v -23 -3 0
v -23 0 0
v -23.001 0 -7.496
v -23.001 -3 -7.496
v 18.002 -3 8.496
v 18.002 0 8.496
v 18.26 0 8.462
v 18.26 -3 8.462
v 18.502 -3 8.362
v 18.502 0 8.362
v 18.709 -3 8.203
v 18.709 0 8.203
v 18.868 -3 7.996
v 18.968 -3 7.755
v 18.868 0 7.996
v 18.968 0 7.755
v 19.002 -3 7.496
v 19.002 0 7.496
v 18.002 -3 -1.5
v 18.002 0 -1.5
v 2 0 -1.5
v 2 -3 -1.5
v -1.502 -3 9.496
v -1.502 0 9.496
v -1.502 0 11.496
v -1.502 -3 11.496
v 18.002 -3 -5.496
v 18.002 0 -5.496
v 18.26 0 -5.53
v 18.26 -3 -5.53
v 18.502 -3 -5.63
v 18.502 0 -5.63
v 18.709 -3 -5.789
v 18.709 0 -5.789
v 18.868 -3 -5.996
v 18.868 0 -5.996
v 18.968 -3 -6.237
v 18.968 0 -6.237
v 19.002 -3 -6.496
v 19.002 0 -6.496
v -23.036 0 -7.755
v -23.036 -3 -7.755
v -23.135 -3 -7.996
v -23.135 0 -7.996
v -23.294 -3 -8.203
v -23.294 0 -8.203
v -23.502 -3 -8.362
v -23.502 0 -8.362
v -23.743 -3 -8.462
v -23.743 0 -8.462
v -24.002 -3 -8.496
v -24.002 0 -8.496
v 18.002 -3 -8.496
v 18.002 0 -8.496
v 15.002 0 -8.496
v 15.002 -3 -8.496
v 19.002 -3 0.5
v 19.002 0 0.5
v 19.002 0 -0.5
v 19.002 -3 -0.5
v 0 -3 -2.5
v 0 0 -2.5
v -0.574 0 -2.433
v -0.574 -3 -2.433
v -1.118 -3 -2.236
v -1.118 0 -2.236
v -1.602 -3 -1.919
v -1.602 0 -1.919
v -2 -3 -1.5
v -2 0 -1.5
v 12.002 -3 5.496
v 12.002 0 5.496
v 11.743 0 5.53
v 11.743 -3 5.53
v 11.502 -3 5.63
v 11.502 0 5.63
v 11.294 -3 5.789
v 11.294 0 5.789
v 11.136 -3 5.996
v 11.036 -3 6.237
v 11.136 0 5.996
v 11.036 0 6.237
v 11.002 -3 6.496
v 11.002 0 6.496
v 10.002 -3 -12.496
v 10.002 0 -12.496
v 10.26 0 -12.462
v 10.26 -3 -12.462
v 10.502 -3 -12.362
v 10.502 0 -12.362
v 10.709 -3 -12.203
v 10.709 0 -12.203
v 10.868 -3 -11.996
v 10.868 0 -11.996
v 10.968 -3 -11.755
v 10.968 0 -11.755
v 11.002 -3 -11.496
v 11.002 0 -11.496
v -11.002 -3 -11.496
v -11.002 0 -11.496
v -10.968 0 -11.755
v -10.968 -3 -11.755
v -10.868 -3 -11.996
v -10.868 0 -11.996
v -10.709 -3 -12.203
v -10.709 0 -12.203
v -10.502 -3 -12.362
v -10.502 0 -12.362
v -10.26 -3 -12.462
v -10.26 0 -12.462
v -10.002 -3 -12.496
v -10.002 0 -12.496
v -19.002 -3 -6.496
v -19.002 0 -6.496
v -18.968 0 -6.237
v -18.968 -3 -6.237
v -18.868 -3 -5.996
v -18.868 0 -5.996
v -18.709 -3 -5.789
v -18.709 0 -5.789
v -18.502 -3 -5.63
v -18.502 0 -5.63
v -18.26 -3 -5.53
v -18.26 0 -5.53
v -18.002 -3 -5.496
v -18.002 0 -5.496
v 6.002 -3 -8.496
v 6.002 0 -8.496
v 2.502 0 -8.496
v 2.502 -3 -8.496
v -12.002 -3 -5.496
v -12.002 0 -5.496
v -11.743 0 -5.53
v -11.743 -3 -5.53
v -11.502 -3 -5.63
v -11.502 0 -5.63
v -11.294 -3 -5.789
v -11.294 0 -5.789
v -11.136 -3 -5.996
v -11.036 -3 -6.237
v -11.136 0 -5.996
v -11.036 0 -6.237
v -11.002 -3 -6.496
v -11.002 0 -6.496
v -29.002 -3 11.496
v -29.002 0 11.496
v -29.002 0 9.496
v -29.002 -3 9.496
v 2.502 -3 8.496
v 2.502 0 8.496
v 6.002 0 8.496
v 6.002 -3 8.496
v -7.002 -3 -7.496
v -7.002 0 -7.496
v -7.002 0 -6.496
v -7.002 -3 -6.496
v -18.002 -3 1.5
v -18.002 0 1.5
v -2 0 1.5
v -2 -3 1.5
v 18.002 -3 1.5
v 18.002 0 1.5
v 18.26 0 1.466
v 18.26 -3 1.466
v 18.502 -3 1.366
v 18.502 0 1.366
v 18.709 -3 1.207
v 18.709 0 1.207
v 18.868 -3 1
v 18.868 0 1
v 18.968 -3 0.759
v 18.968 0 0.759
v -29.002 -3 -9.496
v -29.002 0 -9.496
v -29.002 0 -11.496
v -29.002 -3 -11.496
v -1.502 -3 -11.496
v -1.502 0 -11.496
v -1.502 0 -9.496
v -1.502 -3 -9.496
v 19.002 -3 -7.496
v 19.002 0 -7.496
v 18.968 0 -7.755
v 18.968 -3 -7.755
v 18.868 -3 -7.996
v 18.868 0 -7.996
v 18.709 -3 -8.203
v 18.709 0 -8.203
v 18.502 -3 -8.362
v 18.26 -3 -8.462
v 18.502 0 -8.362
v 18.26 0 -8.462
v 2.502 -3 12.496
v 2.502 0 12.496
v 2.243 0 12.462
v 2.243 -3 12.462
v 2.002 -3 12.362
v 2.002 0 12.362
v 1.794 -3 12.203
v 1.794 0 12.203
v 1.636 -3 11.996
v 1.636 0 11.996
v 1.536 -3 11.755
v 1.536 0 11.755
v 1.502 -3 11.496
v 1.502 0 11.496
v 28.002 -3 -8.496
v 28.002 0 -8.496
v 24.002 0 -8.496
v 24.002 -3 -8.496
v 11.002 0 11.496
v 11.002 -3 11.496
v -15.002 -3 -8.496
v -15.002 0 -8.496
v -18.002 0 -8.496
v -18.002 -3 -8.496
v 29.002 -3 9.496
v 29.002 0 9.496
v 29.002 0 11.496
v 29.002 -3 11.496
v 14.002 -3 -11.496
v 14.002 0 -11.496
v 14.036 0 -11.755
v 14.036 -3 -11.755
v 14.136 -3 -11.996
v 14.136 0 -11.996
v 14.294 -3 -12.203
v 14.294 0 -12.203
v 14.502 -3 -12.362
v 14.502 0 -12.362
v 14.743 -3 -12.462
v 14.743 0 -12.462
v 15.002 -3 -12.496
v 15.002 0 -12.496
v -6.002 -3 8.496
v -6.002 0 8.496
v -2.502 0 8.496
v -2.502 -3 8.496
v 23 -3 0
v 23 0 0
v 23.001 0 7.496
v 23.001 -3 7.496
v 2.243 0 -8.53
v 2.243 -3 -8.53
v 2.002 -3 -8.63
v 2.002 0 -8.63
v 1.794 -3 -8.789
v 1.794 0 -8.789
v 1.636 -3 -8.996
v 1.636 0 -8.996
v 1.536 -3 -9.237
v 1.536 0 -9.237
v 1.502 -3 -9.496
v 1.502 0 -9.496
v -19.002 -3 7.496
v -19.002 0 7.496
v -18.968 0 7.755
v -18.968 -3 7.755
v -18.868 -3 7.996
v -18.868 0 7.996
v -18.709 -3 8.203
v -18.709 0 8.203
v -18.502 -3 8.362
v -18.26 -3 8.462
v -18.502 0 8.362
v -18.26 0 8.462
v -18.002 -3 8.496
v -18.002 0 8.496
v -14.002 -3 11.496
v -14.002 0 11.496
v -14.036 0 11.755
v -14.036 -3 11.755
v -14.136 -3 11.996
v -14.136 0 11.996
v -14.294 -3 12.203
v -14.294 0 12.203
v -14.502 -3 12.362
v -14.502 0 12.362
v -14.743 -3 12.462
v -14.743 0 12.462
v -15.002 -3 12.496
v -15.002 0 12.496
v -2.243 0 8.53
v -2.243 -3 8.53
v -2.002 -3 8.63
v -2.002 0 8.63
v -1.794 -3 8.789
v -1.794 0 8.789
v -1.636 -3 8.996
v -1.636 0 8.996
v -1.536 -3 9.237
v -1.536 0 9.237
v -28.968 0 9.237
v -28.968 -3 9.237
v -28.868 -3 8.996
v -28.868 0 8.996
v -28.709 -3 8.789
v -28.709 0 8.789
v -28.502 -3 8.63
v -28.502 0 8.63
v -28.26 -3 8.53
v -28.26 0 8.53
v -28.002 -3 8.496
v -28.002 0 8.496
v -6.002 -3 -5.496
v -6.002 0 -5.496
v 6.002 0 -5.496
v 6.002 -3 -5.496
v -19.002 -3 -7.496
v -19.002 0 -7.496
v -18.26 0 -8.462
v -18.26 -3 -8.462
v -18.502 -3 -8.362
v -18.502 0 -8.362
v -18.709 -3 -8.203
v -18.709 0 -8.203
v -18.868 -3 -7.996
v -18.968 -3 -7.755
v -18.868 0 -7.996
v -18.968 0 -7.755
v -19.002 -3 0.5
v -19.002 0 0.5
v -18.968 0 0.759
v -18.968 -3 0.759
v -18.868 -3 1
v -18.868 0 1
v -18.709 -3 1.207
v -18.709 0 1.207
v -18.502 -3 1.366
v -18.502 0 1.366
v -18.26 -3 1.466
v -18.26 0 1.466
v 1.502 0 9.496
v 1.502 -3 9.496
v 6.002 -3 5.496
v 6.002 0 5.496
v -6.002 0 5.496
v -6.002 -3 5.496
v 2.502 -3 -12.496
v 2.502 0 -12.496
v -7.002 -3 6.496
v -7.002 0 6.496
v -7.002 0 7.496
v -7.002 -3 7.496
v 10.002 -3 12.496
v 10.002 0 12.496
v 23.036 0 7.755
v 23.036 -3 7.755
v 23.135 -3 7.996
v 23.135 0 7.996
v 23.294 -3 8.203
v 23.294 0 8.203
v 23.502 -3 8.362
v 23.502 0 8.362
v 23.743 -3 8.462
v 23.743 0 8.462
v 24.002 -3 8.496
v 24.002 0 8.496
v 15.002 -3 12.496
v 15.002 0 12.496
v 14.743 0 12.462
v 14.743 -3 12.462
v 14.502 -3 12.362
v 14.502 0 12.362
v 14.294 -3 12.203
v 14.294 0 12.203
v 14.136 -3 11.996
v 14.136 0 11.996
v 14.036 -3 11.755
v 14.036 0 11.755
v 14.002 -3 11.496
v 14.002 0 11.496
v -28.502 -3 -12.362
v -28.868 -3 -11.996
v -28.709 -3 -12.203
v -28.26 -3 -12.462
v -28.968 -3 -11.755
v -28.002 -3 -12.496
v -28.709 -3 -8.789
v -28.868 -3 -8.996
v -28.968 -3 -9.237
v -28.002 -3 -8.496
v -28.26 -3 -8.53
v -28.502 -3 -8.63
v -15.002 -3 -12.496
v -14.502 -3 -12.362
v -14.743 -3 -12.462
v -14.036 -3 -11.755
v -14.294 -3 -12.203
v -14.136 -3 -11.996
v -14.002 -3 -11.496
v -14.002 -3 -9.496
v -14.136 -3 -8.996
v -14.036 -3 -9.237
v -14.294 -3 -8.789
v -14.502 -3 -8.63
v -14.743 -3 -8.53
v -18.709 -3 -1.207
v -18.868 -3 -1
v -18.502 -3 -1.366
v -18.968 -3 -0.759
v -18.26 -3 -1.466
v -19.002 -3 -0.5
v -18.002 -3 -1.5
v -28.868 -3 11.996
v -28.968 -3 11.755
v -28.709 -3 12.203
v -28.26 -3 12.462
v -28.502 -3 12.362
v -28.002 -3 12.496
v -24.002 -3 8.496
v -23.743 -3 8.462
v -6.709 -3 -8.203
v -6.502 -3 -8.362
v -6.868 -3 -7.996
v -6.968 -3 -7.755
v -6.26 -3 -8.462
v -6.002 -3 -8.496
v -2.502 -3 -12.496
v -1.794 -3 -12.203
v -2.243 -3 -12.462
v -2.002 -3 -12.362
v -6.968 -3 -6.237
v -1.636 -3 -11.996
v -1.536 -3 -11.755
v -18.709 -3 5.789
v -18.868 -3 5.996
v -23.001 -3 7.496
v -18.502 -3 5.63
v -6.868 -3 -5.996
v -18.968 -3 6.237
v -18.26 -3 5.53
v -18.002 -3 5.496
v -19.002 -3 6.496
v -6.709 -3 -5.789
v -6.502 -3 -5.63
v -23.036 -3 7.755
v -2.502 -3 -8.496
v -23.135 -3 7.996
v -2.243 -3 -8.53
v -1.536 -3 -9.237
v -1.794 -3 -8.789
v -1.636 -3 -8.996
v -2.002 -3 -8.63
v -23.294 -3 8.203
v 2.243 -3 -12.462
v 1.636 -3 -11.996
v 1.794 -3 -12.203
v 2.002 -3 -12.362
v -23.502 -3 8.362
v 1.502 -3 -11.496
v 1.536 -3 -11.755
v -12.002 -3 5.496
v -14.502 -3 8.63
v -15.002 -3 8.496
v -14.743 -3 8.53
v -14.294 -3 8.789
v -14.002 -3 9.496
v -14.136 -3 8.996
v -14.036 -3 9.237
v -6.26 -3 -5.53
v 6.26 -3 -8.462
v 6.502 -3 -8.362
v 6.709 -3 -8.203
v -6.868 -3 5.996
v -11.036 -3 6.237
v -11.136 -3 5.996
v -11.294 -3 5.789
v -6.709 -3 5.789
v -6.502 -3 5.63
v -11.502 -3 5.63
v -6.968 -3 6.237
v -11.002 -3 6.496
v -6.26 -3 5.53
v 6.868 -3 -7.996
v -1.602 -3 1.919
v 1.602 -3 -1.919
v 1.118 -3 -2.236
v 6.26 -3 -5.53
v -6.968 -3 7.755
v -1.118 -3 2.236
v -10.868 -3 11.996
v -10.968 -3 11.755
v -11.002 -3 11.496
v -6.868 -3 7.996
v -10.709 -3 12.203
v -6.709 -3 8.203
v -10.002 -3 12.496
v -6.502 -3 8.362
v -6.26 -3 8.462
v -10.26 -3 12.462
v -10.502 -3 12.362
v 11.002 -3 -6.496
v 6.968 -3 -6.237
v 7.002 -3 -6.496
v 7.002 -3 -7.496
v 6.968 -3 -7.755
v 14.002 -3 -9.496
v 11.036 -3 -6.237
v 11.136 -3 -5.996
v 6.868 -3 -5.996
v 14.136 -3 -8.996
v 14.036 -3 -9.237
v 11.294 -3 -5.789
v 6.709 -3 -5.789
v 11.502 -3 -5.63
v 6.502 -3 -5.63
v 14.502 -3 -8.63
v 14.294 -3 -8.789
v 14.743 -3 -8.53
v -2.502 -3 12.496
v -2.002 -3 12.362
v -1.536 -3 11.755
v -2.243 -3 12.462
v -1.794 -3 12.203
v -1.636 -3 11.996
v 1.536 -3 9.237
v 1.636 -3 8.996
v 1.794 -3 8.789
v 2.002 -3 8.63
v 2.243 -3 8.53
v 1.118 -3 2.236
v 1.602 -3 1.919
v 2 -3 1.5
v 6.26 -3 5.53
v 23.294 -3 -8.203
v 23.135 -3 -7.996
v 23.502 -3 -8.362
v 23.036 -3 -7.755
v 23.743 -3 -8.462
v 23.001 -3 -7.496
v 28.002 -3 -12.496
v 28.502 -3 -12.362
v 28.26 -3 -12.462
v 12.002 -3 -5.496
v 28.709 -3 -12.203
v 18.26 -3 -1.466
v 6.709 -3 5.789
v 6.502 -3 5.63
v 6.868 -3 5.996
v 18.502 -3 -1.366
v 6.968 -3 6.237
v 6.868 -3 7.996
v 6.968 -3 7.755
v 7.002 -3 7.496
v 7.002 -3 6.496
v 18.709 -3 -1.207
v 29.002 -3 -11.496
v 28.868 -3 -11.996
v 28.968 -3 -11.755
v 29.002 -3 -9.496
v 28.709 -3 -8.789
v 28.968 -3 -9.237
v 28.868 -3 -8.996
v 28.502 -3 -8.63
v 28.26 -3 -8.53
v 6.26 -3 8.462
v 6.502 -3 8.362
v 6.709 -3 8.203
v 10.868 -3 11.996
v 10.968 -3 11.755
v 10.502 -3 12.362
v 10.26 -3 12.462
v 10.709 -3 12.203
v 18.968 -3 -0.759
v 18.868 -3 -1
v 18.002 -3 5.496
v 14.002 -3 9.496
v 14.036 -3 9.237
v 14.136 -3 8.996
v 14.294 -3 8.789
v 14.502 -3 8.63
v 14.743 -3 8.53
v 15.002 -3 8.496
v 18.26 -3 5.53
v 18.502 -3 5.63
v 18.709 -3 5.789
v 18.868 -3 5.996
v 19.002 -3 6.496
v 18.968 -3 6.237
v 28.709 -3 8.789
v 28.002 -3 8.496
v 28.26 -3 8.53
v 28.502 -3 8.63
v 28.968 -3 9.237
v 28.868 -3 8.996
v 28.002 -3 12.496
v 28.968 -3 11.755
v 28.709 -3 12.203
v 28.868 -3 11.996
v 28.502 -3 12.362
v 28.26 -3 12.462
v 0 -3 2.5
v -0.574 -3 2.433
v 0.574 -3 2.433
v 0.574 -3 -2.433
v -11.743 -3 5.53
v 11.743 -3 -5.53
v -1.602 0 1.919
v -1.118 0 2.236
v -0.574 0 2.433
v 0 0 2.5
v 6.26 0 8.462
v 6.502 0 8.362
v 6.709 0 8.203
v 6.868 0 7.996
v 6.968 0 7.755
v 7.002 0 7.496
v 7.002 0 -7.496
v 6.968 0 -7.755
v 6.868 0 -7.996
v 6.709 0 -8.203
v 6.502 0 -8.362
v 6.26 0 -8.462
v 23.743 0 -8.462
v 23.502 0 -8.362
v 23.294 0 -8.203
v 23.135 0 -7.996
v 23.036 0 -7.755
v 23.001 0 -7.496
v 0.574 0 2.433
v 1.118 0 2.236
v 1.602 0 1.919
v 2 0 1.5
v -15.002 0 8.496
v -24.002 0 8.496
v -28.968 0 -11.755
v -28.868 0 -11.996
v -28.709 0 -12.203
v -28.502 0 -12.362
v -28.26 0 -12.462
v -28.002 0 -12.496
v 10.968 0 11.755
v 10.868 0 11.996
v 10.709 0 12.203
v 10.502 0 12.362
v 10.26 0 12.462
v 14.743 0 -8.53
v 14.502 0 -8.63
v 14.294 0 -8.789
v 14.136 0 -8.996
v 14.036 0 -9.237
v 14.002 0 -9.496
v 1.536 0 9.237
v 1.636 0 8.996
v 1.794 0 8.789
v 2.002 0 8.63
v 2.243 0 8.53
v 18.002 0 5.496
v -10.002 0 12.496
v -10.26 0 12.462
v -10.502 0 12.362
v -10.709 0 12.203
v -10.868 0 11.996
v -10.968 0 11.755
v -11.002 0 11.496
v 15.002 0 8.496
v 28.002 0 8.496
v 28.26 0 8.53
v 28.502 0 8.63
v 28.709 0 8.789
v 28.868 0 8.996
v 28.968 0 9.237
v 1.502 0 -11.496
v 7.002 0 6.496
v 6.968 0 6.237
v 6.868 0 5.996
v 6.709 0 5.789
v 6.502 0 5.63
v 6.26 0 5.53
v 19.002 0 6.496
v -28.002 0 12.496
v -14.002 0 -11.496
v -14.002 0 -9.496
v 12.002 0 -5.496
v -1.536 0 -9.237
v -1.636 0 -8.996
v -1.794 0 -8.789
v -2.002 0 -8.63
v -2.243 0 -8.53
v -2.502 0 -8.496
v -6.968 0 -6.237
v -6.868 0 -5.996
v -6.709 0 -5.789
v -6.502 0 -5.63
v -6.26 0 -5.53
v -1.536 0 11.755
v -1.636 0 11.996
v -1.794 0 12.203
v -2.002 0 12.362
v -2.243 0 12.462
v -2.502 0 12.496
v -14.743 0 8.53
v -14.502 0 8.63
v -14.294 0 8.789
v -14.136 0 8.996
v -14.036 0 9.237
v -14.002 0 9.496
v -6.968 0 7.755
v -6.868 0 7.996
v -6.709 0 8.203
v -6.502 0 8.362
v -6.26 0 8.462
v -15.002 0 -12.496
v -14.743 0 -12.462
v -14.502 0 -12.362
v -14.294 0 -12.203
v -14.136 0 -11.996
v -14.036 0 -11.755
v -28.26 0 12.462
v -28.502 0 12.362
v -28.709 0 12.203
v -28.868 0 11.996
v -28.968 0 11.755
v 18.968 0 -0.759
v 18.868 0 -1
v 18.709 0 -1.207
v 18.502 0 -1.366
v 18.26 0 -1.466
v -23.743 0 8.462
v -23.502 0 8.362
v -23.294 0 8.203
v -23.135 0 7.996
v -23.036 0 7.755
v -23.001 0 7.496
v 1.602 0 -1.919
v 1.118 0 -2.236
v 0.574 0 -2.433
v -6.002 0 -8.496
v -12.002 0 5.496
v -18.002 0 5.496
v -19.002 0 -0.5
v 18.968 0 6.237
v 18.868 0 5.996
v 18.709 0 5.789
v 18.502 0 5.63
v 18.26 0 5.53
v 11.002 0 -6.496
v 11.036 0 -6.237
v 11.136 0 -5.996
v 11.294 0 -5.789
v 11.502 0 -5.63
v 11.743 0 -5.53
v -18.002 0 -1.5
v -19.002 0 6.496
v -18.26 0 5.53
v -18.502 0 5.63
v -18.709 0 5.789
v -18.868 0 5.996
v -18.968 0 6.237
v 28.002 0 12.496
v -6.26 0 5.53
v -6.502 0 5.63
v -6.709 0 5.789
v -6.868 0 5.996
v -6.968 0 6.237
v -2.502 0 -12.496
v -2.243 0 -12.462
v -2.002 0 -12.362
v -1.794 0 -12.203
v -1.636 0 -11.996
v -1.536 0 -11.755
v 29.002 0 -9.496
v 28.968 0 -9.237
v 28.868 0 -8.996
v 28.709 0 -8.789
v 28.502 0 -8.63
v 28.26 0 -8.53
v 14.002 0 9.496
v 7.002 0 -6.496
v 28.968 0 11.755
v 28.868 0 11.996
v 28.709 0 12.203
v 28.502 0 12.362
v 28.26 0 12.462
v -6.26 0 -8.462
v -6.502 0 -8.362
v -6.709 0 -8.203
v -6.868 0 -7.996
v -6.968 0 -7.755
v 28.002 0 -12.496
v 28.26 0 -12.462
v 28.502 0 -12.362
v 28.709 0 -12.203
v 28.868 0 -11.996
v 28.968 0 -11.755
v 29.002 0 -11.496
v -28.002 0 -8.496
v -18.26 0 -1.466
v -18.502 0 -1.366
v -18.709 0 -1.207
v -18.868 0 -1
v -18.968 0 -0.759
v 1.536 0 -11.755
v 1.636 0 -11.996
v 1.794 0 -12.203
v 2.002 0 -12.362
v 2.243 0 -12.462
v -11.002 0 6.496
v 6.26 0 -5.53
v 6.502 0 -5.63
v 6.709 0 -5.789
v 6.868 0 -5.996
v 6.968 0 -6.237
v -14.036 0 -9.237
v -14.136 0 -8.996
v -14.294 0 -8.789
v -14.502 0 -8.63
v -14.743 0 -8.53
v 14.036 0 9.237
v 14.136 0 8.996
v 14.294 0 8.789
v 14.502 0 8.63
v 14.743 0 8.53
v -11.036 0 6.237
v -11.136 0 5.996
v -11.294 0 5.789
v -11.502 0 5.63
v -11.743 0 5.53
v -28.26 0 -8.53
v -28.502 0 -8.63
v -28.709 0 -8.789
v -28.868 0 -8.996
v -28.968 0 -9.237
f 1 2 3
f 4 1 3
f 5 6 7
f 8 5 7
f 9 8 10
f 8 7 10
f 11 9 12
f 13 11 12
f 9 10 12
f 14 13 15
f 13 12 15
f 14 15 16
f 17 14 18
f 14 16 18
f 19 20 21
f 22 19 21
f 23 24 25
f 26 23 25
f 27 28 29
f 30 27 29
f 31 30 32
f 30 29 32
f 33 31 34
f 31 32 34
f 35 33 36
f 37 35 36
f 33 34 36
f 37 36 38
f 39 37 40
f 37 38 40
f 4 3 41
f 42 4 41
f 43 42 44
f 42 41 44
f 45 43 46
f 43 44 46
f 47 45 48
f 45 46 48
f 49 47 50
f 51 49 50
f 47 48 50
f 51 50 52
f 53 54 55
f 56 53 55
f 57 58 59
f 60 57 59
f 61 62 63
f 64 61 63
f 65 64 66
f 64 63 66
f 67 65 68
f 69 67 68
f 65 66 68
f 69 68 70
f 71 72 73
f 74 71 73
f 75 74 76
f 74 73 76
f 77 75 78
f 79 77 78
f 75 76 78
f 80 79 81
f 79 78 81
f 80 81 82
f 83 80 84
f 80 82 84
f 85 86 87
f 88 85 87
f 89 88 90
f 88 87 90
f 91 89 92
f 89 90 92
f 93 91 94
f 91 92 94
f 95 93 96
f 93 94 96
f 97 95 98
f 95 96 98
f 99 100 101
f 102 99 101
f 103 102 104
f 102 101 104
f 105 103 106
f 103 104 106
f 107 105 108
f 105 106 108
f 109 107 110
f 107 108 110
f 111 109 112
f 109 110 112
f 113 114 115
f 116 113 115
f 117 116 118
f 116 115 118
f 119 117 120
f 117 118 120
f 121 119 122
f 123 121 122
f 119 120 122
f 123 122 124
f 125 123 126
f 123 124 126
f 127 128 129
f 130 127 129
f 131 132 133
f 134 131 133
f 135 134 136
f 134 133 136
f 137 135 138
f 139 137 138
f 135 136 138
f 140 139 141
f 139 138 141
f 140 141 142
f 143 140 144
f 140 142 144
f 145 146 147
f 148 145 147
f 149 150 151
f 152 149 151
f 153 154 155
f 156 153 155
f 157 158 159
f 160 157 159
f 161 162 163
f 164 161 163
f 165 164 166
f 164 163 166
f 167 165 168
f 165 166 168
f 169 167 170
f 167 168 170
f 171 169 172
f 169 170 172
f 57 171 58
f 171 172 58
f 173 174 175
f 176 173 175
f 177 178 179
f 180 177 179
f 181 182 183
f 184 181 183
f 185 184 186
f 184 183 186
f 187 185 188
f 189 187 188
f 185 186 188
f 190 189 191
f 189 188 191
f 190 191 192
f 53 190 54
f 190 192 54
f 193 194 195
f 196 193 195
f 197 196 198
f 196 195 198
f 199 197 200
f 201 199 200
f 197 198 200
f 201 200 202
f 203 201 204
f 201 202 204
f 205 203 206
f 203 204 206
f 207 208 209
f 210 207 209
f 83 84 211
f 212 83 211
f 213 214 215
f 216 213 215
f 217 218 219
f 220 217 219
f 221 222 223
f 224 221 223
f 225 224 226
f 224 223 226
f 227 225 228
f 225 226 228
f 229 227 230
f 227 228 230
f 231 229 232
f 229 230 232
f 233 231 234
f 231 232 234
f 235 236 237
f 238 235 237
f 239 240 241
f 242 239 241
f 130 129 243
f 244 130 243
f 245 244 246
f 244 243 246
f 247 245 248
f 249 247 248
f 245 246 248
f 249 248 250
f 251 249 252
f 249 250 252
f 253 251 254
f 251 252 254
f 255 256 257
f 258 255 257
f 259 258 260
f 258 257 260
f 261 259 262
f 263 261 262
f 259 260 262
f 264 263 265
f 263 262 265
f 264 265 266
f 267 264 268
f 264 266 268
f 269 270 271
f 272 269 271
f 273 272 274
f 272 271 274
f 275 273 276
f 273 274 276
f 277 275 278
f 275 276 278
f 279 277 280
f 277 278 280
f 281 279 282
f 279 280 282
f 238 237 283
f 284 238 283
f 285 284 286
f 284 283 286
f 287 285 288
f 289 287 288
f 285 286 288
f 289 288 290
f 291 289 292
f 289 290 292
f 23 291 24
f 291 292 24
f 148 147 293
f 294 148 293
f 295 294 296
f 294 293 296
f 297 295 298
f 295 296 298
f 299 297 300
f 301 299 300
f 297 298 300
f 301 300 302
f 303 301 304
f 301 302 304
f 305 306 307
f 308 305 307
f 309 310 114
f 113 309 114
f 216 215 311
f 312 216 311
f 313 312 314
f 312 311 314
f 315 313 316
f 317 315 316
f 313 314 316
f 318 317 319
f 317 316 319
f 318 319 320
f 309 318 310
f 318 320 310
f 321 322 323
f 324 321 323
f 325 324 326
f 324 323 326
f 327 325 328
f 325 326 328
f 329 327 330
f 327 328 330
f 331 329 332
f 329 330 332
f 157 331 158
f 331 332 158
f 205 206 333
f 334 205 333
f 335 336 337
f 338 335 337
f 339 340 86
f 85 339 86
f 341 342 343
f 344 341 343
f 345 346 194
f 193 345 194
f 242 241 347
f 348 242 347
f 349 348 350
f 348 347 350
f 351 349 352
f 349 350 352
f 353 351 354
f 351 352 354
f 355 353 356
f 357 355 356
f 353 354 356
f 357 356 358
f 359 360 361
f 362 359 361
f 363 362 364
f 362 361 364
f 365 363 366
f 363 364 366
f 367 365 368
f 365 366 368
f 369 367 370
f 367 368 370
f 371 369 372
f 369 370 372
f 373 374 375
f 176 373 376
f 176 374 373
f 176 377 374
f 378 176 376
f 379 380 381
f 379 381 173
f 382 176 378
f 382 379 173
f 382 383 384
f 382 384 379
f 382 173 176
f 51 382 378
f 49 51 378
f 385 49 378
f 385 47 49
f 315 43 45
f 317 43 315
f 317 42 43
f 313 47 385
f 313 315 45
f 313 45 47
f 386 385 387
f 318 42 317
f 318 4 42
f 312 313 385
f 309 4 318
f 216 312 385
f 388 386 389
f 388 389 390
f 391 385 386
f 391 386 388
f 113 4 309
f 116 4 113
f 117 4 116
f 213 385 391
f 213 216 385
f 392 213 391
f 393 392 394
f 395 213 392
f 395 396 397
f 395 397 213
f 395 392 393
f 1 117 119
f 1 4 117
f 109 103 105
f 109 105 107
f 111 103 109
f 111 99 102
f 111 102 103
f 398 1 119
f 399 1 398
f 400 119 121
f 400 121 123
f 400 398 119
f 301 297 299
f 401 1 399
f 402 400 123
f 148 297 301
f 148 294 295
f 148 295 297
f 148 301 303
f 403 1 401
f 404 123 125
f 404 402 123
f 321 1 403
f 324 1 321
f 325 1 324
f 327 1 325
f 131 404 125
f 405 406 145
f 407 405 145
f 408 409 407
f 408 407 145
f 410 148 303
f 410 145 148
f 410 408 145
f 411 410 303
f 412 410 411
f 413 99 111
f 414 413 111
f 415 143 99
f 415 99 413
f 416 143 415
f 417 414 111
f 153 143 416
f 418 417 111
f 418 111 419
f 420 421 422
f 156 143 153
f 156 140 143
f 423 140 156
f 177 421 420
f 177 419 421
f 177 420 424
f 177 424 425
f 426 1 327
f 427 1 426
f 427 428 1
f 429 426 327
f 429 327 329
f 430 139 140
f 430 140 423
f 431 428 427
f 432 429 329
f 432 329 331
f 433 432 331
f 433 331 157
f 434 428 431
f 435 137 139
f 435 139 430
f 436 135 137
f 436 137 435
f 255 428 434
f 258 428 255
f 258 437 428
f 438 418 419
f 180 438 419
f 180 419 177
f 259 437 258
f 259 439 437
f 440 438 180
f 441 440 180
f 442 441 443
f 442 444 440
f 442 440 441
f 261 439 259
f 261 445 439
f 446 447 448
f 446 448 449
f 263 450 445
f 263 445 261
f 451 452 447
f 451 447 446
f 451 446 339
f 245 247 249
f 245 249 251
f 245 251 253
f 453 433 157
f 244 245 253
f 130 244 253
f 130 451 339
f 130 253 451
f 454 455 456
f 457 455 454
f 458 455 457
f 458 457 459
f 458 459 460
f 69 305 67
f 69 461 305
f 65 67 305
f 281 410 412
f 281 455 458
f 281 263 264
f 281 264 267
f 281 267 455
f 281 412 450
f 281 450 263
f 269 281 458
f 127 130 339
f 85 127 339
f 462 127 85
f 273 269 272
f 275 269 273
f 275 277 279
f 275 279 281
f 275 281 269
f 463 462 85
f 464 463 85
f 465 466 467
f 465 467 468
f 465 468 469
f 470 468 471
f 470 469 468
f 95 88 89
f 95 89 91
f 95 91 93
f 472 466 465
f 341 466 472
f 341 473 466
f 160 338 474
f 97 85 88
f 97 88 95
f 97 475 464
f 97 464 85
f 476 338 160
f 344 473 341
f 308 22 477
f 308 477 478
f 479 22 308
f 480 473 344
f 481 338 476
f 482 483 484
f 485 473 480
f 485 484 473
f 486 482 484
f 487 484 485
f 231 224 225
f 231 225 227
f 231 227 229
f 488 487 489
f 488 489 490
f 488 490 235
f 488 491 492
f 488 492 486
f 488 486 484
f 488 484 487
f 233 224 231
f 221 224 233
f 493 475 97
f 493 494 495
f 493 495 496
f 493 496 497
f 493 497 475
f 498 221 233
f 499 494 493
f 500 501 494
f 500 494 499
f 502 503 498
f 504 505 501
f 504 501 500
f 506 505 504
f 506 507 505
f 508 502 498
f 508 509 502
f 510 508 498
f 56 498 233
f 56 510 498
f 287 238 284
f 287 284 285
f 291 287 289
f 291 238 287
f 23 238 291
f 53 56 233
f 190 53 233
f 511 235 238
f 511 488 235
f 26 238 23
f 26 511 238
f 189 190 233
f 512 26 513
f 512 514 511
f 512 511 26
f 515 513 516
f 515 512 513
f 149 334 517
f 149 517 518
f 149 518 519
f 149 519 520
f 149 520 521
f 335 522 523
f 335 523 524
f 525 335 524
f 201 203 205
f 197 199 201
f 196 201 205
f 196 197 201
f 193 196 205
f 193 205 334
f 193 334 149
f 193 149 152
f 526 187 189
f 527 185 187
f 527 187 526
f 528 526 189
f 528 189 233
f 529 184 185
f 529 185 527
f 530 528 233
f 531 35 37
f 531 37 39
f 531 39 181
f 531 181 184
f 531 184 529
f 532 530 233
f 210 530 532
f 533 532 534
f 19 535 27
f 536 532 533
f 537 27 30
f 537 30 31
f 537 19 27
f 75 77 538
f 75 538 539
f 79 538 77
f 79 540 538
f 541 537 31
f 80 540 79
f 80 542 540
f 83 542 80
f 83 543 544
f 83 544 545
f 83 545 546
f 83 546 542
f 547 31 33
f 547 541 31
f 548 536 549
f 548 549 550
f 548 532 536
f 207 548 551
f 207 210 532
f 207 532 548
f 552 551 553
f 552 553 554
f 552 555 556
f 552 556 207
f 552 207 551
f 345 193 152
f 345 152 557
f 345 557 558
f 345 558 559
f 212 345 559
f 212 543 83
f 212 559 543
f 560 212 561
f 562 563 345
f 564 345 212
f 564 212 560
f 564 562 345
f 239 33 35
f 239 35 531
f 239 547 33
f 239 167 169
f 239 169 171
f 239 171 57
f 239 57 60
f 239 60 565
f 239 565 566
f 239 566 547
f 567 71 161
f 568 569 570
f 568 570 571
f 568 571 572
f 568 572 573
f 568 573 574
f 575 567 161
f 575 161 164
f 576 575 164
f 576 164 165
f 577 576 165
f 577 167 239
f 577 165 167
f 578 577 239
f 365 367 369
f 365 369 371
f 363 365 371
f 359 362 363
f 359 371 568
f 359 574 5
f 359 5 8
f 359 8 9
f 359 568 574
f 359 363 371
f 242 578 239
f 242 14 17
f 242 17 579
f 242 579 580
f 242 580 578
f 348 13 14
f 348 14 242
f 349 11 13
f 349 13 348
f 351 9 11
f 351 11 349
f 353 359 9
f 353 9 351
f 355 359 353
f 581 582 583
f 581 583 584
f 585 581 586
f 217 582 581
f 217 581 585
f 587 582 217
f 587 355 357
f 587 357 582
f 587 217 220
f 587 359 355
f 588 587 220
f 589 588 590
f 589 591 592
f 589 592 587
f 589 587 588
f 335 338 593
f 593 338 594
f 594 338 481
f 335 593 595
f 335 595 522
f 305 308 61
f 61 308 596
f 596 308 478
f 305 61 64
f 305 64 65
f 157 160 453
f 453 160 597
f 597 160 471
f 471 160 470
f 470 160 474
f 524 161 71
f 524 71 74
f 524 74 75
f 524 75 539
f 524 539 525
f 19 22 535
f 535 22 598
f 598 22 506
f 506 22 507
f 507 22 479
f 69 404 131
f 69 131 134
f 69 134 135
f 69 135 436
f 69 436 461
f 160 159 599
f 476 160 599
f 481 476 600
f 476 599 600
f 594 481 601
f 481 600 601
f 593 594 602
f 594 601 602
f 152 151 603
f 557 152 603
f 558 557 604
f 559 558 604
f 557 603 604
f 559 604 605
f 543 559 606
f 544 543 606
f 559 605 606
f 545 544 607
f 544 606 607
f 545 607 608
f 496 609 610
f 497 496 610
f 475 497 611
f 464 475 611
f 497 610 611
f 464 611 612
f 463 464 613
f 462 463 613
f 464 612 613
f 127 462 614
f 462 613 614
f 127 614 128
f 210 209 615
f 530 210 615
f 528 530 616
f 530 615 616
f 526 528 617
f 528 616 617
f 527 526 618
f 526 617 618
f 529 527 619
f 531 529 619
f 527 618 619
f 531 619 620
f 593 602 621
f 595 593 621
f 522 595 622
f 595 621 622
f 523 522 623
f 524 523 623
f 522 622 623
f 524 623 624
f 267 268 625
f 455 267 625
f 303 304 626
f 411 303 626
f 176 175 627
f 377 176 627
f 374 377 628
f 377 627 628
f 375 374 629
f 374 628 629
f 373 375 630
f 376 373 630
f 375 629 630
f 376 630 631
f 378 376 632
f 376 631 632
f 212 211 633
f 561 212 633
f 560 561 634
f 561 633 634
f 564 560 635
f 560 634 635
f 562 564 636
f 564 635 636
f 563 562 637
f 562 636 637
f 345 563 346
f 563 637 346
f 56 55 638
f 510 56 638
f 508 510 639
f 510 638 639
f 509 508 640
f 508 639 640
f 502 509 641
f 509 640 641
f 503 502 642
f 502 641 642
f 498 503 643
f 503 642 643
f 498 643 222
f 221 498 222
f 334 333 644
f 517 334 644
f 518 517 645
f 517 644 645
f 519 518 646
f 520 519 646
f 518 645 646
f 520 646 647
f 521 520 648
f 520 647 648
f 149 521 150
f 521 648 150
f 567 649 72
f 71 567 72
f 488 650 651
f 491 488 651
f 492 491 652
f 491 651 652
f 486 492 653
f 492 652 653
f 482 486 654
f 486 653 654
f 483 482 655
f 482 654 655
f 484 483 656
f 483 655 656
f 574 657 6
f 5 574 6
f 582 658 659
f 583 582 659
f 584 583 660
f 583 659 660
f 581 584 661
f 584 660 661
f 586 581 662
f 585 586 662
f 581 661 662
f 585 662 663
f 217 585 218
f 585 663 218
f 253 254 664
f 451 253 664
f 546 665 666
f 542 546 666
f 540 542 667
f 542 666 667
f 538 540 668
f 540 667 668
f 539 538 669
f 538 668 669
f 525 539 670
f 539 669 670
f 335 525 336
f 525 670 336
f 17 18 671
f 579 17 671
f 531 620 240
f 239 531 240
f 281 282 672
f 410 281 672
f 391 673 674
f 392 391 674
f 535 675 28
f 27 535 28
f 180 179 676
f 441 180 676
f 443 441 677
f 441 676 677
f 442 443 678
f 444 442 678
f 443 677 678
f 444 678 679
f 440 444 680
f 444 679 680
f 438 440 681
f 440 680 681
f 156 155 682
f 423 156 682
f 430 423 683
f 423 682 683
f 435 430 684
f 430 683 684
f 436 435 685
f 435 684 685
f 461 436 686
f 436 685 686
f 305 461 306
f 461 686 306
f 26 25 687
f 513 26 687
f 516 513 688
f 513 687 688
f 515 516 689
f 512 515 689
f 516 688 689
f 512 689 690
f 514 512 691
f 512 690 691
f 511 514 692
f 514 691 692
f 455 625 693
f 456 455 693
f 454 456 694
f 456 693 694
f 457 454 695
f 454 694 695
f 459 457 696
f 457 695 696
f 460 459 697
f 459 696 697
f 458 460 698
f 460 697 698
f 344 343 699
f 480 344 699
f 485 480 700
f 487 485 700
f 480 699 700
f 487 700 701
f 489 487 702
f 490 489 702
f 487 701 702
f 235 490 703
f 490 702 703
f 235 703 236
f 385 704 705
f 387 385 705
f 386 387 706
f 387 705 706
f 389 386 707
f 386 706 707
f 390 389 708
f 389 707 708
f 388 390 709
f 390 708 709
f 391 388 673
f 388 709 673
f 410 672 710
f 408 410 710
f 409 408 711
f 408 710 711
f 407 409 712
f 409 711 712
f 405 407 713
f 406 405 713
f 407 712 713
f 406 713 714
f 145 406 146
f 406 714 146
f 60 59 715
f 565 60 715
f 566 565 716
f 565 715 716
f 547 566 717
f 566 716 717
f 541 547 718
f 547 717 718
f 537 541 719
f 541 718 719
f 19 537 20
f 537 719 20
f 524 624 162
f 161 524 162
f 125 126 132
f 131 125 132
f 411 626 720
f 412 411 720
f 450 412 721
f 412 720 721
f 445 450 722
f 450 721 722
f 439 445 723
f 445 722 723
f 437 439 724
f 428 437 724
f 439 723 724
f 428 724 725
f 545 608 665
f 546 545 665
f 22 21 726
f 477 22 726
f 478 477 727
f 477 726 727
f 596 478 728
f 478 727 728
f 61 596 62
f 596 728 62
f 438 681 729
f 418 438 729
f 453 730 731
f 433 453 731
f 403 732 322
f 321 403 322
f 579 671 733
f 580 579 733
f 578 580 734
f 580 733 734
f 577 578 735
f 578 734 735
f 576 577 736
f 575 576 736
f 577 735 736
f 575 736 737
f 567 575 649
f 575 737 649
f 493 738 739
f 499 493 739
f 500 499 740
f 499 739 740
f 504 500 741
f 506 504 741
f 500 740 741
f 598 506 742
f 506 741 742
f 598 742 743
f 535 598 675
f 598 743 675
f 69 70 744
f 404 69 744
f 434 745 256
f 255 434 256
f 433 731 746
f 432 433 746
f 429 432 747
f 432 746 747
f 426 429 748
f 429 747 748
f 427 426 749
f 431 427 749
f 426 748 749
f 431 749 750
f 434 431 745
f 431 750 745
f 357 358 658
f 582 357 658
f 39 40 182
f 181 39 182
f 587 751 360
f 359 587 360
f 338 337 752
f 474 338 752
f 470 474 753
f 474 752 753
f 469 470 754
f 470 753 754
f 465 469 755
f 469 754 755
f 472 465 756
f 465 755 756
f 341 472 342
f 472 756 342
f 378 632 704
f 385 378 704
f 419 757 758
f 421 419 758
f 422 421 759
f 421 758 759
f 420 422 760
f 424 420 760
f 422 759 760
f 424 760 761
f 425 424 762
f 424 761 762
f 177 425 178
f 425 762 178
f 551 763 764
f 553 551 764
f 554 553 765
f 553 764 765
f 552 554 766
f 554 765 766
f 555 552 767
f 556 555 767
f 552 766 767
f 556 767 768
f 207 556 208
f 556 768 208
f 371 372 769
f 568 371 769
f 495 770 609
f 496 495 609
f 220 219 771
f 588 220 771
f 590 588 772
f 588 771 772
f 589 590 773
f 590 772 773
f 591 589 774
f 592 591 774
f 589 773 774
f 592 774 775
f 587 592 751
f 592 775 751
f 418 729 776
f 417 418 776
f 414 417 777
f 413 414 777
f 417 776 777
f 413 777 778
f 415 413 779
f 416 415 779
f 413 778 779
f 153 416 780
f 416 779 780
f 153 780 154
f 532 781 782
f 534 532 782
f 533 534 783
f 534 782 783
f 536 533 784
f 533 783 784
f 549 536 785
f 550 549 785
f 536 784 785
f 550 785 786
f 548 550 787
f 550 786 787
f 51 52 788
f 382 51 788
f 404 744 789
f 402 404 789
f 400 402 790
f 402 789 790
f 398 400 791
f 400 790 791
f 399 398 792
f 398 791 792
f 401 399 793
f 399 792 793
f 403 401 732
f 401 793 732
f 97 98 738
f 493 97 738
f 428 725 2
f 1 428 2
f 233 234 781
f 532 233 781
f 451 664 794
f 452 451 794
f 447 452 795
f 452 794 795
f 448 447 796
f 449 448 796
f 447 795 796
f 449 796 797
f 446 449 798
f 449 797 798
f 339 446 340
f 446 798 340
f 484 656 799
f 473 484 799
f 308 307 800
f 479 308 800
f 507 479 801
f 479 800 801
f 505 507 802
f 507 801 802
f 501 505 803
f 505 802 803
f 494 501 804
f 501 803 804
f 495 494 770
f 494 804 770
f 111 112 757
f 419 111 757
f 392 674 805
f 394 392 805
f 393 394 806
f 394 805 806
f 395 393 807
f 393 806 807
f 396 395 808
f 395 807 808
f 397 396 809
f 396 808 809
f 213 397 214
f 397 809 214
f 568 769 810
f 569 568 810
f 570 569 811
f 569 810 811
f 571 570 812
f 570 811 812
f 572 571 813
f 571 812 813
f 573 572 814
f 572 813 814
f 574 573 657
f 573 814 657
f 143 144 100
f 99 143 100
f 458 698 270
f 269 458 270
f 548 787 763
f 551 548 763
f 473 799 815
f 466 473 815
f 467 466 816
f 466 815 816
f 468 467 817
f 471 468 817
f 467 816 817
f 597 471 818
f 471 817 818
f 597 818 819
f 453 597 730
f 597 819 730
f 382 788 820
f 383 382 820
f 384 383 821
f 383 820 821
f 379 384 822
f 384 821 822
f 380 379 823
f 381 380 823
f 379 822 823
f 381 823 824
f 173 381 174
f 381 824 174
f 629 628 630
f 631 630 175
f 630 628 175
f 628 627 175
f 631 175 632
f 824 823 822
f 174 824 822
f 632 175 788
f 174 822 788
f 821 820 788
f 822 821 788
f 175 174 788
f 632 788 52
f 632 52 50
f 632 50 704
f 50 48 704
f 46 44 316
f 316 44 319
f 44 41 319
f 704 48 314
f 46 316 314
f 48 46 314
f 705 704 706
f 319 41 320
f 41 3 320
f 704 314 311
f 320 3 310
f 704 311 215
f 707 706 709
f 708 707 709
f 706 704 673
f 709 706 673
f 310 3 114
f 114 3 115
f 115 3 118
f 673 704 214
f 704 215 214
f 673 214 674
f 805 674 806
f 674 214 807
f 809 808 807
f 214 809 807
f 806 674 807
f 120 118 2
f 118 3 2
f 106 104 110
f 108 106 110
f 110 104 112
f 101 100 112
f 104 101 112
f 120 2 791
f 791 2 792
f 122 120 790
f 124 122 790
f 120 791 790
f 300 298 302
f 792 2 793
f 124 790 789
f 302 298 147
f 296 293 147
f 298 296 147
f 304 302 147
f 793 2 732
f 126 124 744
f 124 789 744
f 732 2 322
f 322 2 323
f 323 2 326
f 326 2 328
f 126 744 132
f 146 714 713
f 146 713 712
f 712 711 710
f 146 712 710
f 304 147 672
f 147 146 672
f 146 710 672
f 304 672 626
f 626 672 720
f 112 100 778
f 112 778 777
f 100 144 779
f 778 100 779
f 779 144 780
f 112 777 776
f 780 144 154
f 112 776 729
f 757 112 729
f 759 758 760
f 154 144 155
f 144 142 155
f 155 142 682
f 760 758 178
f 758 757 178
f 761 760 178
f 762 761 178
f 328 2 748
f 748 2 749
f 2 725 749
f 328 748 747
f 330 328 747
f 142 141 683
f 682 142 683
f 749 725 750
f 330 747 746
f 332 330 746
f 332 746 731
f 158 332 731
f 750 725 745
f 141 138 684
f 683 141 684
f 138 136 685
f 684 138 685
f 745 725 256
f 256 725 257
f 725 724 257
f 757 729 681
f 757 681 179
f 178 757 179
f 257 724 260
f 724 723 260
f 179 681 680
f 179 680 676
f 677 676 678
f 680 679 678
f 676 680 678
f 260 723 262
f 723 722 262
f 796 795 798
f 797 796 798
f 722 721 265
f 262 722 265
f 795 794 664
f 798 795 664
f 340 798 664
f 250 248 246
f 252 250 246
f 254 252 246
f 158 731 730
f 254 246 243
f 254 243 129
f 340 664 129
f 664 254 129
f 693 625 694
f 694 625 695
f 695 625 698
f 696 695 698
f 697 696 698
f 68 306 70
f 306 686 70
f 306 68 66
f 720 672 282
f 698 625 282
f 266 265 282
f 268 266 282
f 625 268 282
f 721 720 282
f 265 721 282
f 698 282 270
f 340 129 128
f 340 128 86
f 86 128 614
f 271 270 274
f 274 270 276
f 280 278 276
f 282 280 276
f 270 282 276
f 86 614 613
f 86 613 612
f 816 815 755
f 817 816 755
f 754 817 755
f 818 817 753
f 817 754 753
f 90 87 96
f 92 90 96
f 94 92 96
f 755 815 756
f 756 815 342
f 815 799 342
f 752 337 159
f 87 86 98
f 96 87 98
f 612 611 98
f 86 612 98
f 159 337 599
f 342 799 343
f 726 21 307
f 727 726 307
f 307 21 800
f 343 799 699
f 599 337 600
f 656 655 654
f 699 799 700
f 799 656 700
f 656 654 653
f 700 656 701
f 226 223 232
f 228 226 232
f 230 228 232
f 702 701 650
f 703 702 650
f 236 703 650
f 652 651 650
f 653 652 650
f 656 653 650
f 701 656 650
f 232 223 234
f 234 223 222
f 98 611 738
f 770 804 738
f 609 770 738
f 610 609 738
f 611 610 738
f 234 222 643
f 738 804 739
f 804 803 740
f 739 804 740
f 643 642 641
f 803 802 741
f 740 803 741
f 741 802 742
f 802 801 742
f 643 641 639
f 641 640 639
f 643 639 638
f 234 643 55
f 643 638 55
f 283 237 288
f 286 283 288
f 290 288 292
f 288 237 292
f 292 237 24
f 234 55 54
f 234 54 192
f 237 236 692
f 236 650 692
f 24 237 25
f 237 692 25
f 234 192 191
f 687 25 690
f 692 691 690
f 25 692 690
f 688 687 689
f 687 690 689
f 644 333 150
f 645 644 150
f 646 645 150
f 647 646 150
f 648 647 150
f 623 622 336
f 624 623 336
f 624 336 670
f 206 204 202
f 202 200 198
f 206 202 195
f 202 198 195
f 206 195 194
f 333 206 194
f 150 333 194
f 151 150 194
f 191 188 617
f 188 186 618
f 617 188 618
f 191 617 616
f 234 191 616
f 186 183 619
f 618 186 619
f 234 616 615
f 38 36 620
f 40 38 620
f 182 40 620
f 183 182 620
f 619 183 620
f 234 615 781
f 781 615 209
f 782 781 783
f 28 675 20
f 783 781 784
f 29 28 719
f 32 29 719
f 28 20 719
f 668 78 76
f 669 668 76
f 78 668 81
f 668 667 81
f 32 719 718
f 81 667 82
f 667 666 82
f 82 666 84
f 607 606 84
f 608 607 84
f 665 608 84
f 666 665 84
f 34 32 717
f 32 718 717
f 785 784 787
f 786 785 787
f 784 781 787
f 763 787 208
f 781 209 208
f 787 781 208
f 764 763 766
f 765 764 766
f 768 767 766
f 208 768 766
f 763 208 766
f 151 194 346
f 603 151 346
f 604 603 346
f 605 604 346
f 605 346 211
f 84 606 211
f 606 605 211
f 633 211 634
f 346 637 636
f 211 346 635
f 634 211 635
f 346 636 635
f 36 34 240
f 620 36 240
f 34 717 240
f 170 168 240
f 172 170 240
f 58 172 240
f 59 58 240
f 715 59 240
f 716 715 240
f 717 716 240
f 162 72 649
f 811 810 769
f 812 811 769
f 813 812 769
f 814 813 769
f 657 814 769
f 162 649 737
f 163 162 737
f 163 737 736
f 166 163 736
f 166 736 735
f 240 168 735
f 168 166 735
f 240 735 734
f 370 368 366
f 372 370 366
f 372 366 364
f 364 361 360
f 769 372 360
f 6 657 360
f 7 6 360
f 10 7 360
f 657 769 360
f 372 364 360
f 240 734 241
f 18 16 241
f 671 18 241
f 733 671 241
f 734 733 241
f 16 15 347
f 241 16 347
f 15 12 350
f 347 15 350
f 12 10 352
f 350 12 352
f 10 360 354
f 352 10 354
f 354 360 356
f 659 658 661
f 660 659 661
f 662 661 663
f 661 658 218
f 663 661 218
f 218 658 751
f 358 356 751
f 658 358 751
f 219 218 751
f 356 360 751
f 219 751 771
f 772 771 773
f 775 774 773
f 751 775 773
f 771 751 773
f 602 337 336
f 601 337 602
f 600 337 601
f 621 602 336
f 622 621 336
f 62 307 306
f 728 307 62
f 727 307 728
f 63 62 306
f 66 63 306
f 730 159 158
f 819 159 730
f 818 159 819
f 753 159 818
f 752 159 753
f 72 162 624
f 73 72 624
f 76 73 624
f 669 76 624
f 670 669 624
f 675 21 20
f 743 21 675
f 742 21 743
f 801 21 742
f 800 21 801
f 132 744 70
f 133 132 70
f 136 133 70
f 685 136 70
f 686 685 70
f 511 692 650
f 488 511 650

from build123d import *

# Parameters (mm, degrees)
F1_DEPTH = 3


# Not quite as in the source:
# - a feature names something its author has since deleted; it is built from what else it names


with BuildPart() as f1:
    # F0 (on Front) → F1 (new body)
    with BuildSketch(Plane.XZ):
        with BuildLine():
            Line((-23.0000003952, 0), (-19.0015753579, 0))
            Line((-19.0015753579, 0), (-19.0015753579, 0.5))
            ThreePointArc((-19.0015753579, 0.5), (-18.7086821391, 1.2071067812), (-18.0015753579, 1.5))
            Line((-18.0015753579, 1.5), (-2, 1.5))
            ThreePointArc((-2, 1.5), (-1.1180339887, 2.2360679775), (0, 2.5))
            Line((0, 2.5), (0, 5.4957361976))
            Line((0, 5.4957361976), (-6.0015753579, 5.4957361976))
            ThreePointArc((-6.0015753579, 5.4957361976), (-6.7086821391, 5.7886294164), (-7.0015753579, 6.4957361976))
            Line((-7.0015753579, 6.4957361976), (-7.0015753579, 7.4957361976))
            ThreePointArc((-7.0015753579, 7.4957361976), (-6.7086821391, 8.2028429788), (-6.0015753579, 8.4957361976))
            Line((-6.0015753579, 8.4957361976), (-2.5015753579, 8.4957361976))
            ThreePointArc((-2.5015753579, 8.4957361976), (-1.7944685767, 8.7886294164), (-1.5015753579, 9.4957361976))
            Line((-1.5015753579, 9.4957361976), (-1.5015753579, 11.4957361976))
            ThreePointArc((-1.5015753579, 11.4957361976), (-1.7944685767, 12.2028429788), (-2.5015753579, 12.4957361976))
            Line((-2.5015753579, 12.4957361976), (-10.0015753579, 12.4957361976))
            ThreePointArc((-10.0015753579, 12.4957361976), (-10.7086821391, 12.2028429788), (-11.0015753579, 11.4957361976))
            Line((-11.0015753579, 11.4957361976), (-11.0015753579, 8.4957361976))
            Line((-11.0015753579, 8.4957361976), (-11.0015753579, 6.4957361976))
            ThreePointArc((-11.0015753579, 6.4957361976), (-11.2944685767, 5.7886294164), (-12.0015753579, 5.4957361976))
            Line((-12.0015753579, 5.4957361976), (-18.0015753579, 5.4957361976))
            ThreePointArc((-18.0015753579, 5.4957361976), (-18.7086821391, 5.7886294164), (-19.0015753579, 6.4957361976))
            Line((-19.0015753579, 6.4957361976), (-19.0015753579, 7.4957361976))
            ThreePointArc((-19.0015753579, 7.4957361976), (-18.7086821391, 8.2028429788), (-18.0015753579, 8.4957361976))
            Line((-18.0015753579, 8.4957361976), (-15.0015753579, 8.4957361976))
            ThreePointArc((-15.0015753579, 8.4957361976), (-14.2944685767, 8.7886294164), (-14.0015753579, 9.4957361976))
            Line((-14.0015753579, 9.4957361976), (-14.0015753579, 11.4957361976))
            ThreePointArc((-14.0015753579, 11.4957361976), (-14.2944685767, 12.2028429788), (-15.0015753579, 12.4957361976))
            Line((-15.0015753579, 12.4957361976), (-28.0015753579, 12.4957361976))
            ThreePointArc((-28.0015753579, 12.4957361976), (-28.7086821391, 12.2028429788), (-29.0015753579, 11.4957361976))
            Line((-29.0015753579, 11.4957361976), (-29.0015753579, 9.4957361976))
            ThreePointArc((-29.0015753579, 9.4957361976), (-28.7086821391, 8.7886294164), (-28.0015753579, 8.4957361976))
            Line((-28.0015753579, 8.4957361976), (-24.0015753579, 8.4957361976))
            ThreePointArc((-24.0015753579, 8.4957361976), (-23.294403037, 8.2028542282), (-23.0013899752, 7.4957362148))
            Line((-23.0013899752, 7.4957362148), (-23.0000003952, 0))
        make_face()
        with BuildLine():
            Line((19.0015753579, 0.5), (19.0015753579, 0))
            Line((19.0015753579, 0), (23.0000003952, 0))
            Line((23.0000003952, 0), (23.0013899752, 7.4957362148))
            ThreePointArc((23.0013899752, 7.4957362148), (23.294403037, 8.2028542282), (24.0015753579, 8.4957361976))
            Line((24.0015753579, 8.4957361976), (28.0015753579, 8.4957361976))
            ThreePointArc((28.0015753579, 8.4957361976), (28.7086821391, 8.7886294164), (29.0015753579, 9.4957361976))
            Line((29.0015753579, 9.4957361976), (29.0015753579, 11.4957361976))
            ThreePointArc((29.0015753579, 11.4957361976), (28.7086821391, 12.2028429788), (28.0015753579, 12.4957361976))
            Line((28.0015753579, 12.4957361976), (15.0015753579, 12.4957361976))
            ThreePointArc((15.0015753579, 12.4957361976), (14.2944685767, 12.2028429788), (14.0015753579, 11.4957361976))
            Line((14.0015753579, 11.4957361976), (14.0015753579, 9.4957361976))
            ThreePointArc((14.0015753579, 9.4957361976), (14.2944685767, 8.7886294164), (15.0015753579, 8.4957361976))
            Line((15.0015753579, 8.4957361976), (18.0015753579, 8.4957361976))
            ThreePointArc((18.0015753579, 8.4957361976), (18.7086821391, 8.2028429788), (19.0015753579, 7.4957361976))
            Line((19.0015753579, 7.4957361976), (19.0015753579, 6.4957361976))
            ThreePointArc((19.0015753579, 6.4957361976), (18.7086821391, 5.7886294164), (18.0015753579, 5.4957361976))
            Line((18.0015753579, 5.4957361976), (12.0015753579, 5.4957361976))
            ThreePointArc((12.0015753579, 5.4957361976), (11.2944685767, 5.7886294164), (11.0015753579, 6.4957361976))
            Line((11.0015753579, 6.4957361976), (11.0015753579, 8.4957361976))
            Line((11.0015753579, 8.4957361976), (11.0015753579, 11.4957361976))
            ThreePointArc((11.0015753579, 11.4957361976), (10.7086821391, 12.2028429788), (10.0015753579, 12.4957361976))
            Line((10.0015753579, 12.4957361976), (2.5015753579, 12.4957361976))
            ThreePointArc((2.5015753579, 12.4957361976), (1.7944685767, 12.2028429788), (1.5015753579, 11.4957361976))
            Line((1.5015753579, 11.4957361976), (1.5015753579, 9.4957361976))
            ThreePointArc((1.5015753579, 9.4957361976), (1.7944685767, 8.7886294164), (2.5015753579, 8.4957361976))
            Line((2.5015753579, 8.4957361976), (6.0015753579, 8.4957361976))
            ThreePointArc((6.0015753579, 8.4957361976), (6.7086821391, 8.2028429788), (7.0015753579, 7.4957361976))
            Line((7.0015753579, 7.4957361976), (7.0015753579, 6.4957361976))
            ThreePointArc((7.0015753579, 6.4957361976), (6.7086821391, 5.7886294164), (6.0015753579, 5.4957361976))
            Line((6.0015753579, 5.4957361976), (0, 5.4957361976))
            Line((0, 5.4957361976), (0, 2.5))
            ThreePointArc((0, 2.5), (1.1180339887, 2.2360679775), (2, 1.5))
            Line((2, 1.5), (18.0015753579, 1.5))
            ThreePointArc((18.0015753579, 1.5), (18.7086821391, 1.2071067812), (19.0015753579, 0.5))
        make_face()
        with BuildLine():
            Line((-6.0015753579, -5.4957361976), (0, -5.4957361976))
            Line((0, -5.4957361976), (0, -2.5))
            ThreePointArc((0, -2.5), (-1.1180339887, -2.2360679775), (-2, -1.5))
            Line((-2, -1.5), (-18.0015753579, -1.5))
            ThreePointArc((-18.0015753579, -1.5), (-18.7086821391, -1.2071067812), (-19.0015753579, -0.5))
            Line((-19.0015753579, -0.5), (-19.0015753579, 0))
            Line((-19.0015753579, 0), (-23.0000003952, 0))
            Line((-23.0000003952, 0), (-23.0013899752, -7.4957362148))
            ThreePointArc((-23.0013899752, -7.4957362148), (-23.294403037, -8.2028542282), (-24.0015753579, -8.4957361976))
            Line((-24.0015753579, -8.4957361976), (-28.0015753579, -8.4957361976))
            ThreePointArc((-28.0015753579, -8.4957361976), (-28.7086821391, -8.7886294164), (-29.0015753579, -9.4957361976))
            Line((-29.0015753579, -9.4957361976), (-29.0015753579, -11.4957361976))
            ThreePointArc((-29.0015753579, -11.4957361976), (-28.7086821391, -12.2028429788), (-28.0015753579, -12.4957361976))
            Line((-28.0015753579, -12.4957361976), (-15.0015753579, -12.4957361976))
            ThreePointArc((-15.0015753579, -12.4957361976), (-14.2944685767, -12.2028429788), (-14.0015753579, -11.4957361976))
            Line((-14.0015753579, -11.4957361976), (-14.0015753579, -9.4957361976))
            ThreePointArc((-14.0015753579, -9.4957361976), (-14.2944685767, -8.7886294164), (-15.0015753579, -8.4957361976))
            Line((-15.0015753579, -8.4957361976), (-18.0015753579, -8.4957361976))
            ThreePointArc((-18.0015753579, -8.4957361976), (-18.7086821391, -8.2028429788), (-19.0015753579, -7.4957361976))
            Line((-19.0015753579, -7.4957361976), (-19.0015753579, -6.4957361976))
            ThreePointArc((-19.0015753579, -6.4957361976), (-18.7086821391, -5.7886294164), (-18.0015753579, -5.4957361976))
            Line((-18.0015753579, -5.4957361976), (-12.0015753579, -5.4957361976))
            ThreePointArc((-12.0015753579, -5.4957361976), (-11.2944685767, -5.7886294164), (-11.0015753579, -6.4957361976))
            Line((-11.0015753579, -6.4957361976), (-11.0015753579, -8.4957361976))
            Line((-11.0015753579, -8.4957361976), (-11.0015753579, -11.4957361976))
            ThreePointArc((-11.0015753579, -11.4957361976), (-10.7086821391, -12.2028429788), (-10.0015753579, -12.4957361976))
            Line((-10.0015753579, -12.4957361976), (-2.5015753579, -12.4957361976))
            ThreePointArc((-2.5015753579, -12.4957361976), (-1.7944685767, -12.2028429788), (-1.5015753579, -11.4957361976))
            Line((-1.5015753579, -11.4957361976), (-1.5015753579, -9.4957361976))
            ThreePointArc((-1.5015753579, -9.4957361976), (-1.7944685767, -8.7886294164), (-2.5015753579, -8.4957361976))
            Line((-2.5015753579, -8.4957361976), (-6.0015753579, -8.4957361976))
            ThreePointArc((-6.0015753579, -8.4957361976), (-6.7086821391, -8.2028429788), (-7.0015753579, -7.4957361976))
            Line((-7.0015753579, -7.4957361976), (-7.0015753579, -6.4957361976))
            ThreePointArc((-7.0015753579, -6.4957361976), (-6.7086821391, -5.7886294164), (-6.0015753579, -5.4957361976))
        make_face()
        with BuildLine():
            ThreePointArc((1.5015753579, -11.4957361976), (1.7944685767, -12.2028429788), (2.5015753579, -12.4957361976))
            Line((2.5015753579, -12.4957361976), (10.0015753579, -12.4957361976))
            ThreePointArc((10.0015753579, -12.4957361976), (10.7086821391, -12.2028429788), (11.0015753579, -11.4957361976))
            Line((11.0015753579, -11.4957361976), (11.0015753579, -8.4957361976))
            Line((11.0015753579, -8.4957361976), (11.0015753579, -6.4957361976))
            ThreePointArc((11.0015753579, -6.4957361976), (11.2944685767, -5.7886294164), (12.0015753579, -5.4957361976))
            Line((12.0015753579, -5.4957361976), (18.0015753579, -5.4957361976))
            ThreePointArc((18.0015753579, -5.4957361976), (18.7086821391, -5.7886294164), (19.0015753579, -6.4957361976))
            Line((19.0015753579, -6.4957361976), (19.0015753579, -7.4957361976))
            ThreePointArc((19.0015753579, -7.4957361976), (18.7086821391, -8.2028429788), (18.0015753579, -8.4957361976))
            Line((18.0015753579, -8.4957361976), (15.0015753579, -8.4957361976))
            ThreePointArc((15.0015753579, -8.4957361976), (14.2944685767, -8.7886294164), (14.0015753579, -9.4957361976))
            Line((14.0015753579, -9.4957361976), (14.0015753579, -11.4957361976))
            ThreePointArc((14.0015753579, -11.4957361976), (14.2944685767, -12.2028429788), (15.0015753579, -12.4957361976))
            Line((15.0015753579, -12.4957361976), (28.0015753579, -12.4957361976))
            ThreePointArc((28.0015753579, -12.4957361976), (28.7086821391, -12.2028429788), (29.0015753579, -11.4957361976))
            Line((29.0015753579, -11.4957361976), (29.0015753579, -9.4957361976))
            ThreePointArc((29.0015753579, -9.4957361976), (28.7086821391, -8.7886294164), (28.0015753579, -8.4957361976))
            Line((28.0015753579, -8.4957361976), (24.0015753579, -8.4957361976))
            ThreePointArc((24.0015753579, -8.4957361976), (23.294403037, -8.2028542282), (23.0013899752, -7.4957362148))
            Line((23.0013899752, -7.4957362148), (23.0000003952, 0))
            Line((23.0000003952, 0), (19.0015753579, 0))
            Line((19.0015753579, 0), (19.0015753579, -0.5))
            ThreePointArc((19.0015753579, -0.5), (18.7086821391, -1.2071067812), (18.0015753579, -1.5))
            Line((18.0015753579, -1.5), (2, -1.5))
            ThreePointArc((2, -1.5), (1.1180339887, -2.2360679775), (0, -2.5))
            Line((0, -2.5), (0, -5.4957361976))
            Line((0, -5.4957361976), (6.0015753579, -5.4957361976))
            ThreePointArc((6.0015753579, -5.4957361976), (6.7086821391, -5.7886294164), (7.0015753579, -6.4957361976))
            Line((7.0015753579, -6.4957361976), (7.0015753579, -7.4957361976))
            ThreePointArc((7.0015753579, -7.4957361976), (6.7086821391, -8.2028429788), (6.0015753579, -8.4957361976))
            Line((6.0015753579, -8.4957361976), (2.5015753579, -8.4957361976))
            ThreePointArc((2.5015753579, -8.4957361976), (1.7944685767, -8.7886294164), (1.5015753579, -9.4957361976))
            Line((1.5015753579, -9.4957361976), (1.5015753579, -11.4957361976))
        make_face()
    extrude(amount=F1_DEPTH)


solid = f1.part
